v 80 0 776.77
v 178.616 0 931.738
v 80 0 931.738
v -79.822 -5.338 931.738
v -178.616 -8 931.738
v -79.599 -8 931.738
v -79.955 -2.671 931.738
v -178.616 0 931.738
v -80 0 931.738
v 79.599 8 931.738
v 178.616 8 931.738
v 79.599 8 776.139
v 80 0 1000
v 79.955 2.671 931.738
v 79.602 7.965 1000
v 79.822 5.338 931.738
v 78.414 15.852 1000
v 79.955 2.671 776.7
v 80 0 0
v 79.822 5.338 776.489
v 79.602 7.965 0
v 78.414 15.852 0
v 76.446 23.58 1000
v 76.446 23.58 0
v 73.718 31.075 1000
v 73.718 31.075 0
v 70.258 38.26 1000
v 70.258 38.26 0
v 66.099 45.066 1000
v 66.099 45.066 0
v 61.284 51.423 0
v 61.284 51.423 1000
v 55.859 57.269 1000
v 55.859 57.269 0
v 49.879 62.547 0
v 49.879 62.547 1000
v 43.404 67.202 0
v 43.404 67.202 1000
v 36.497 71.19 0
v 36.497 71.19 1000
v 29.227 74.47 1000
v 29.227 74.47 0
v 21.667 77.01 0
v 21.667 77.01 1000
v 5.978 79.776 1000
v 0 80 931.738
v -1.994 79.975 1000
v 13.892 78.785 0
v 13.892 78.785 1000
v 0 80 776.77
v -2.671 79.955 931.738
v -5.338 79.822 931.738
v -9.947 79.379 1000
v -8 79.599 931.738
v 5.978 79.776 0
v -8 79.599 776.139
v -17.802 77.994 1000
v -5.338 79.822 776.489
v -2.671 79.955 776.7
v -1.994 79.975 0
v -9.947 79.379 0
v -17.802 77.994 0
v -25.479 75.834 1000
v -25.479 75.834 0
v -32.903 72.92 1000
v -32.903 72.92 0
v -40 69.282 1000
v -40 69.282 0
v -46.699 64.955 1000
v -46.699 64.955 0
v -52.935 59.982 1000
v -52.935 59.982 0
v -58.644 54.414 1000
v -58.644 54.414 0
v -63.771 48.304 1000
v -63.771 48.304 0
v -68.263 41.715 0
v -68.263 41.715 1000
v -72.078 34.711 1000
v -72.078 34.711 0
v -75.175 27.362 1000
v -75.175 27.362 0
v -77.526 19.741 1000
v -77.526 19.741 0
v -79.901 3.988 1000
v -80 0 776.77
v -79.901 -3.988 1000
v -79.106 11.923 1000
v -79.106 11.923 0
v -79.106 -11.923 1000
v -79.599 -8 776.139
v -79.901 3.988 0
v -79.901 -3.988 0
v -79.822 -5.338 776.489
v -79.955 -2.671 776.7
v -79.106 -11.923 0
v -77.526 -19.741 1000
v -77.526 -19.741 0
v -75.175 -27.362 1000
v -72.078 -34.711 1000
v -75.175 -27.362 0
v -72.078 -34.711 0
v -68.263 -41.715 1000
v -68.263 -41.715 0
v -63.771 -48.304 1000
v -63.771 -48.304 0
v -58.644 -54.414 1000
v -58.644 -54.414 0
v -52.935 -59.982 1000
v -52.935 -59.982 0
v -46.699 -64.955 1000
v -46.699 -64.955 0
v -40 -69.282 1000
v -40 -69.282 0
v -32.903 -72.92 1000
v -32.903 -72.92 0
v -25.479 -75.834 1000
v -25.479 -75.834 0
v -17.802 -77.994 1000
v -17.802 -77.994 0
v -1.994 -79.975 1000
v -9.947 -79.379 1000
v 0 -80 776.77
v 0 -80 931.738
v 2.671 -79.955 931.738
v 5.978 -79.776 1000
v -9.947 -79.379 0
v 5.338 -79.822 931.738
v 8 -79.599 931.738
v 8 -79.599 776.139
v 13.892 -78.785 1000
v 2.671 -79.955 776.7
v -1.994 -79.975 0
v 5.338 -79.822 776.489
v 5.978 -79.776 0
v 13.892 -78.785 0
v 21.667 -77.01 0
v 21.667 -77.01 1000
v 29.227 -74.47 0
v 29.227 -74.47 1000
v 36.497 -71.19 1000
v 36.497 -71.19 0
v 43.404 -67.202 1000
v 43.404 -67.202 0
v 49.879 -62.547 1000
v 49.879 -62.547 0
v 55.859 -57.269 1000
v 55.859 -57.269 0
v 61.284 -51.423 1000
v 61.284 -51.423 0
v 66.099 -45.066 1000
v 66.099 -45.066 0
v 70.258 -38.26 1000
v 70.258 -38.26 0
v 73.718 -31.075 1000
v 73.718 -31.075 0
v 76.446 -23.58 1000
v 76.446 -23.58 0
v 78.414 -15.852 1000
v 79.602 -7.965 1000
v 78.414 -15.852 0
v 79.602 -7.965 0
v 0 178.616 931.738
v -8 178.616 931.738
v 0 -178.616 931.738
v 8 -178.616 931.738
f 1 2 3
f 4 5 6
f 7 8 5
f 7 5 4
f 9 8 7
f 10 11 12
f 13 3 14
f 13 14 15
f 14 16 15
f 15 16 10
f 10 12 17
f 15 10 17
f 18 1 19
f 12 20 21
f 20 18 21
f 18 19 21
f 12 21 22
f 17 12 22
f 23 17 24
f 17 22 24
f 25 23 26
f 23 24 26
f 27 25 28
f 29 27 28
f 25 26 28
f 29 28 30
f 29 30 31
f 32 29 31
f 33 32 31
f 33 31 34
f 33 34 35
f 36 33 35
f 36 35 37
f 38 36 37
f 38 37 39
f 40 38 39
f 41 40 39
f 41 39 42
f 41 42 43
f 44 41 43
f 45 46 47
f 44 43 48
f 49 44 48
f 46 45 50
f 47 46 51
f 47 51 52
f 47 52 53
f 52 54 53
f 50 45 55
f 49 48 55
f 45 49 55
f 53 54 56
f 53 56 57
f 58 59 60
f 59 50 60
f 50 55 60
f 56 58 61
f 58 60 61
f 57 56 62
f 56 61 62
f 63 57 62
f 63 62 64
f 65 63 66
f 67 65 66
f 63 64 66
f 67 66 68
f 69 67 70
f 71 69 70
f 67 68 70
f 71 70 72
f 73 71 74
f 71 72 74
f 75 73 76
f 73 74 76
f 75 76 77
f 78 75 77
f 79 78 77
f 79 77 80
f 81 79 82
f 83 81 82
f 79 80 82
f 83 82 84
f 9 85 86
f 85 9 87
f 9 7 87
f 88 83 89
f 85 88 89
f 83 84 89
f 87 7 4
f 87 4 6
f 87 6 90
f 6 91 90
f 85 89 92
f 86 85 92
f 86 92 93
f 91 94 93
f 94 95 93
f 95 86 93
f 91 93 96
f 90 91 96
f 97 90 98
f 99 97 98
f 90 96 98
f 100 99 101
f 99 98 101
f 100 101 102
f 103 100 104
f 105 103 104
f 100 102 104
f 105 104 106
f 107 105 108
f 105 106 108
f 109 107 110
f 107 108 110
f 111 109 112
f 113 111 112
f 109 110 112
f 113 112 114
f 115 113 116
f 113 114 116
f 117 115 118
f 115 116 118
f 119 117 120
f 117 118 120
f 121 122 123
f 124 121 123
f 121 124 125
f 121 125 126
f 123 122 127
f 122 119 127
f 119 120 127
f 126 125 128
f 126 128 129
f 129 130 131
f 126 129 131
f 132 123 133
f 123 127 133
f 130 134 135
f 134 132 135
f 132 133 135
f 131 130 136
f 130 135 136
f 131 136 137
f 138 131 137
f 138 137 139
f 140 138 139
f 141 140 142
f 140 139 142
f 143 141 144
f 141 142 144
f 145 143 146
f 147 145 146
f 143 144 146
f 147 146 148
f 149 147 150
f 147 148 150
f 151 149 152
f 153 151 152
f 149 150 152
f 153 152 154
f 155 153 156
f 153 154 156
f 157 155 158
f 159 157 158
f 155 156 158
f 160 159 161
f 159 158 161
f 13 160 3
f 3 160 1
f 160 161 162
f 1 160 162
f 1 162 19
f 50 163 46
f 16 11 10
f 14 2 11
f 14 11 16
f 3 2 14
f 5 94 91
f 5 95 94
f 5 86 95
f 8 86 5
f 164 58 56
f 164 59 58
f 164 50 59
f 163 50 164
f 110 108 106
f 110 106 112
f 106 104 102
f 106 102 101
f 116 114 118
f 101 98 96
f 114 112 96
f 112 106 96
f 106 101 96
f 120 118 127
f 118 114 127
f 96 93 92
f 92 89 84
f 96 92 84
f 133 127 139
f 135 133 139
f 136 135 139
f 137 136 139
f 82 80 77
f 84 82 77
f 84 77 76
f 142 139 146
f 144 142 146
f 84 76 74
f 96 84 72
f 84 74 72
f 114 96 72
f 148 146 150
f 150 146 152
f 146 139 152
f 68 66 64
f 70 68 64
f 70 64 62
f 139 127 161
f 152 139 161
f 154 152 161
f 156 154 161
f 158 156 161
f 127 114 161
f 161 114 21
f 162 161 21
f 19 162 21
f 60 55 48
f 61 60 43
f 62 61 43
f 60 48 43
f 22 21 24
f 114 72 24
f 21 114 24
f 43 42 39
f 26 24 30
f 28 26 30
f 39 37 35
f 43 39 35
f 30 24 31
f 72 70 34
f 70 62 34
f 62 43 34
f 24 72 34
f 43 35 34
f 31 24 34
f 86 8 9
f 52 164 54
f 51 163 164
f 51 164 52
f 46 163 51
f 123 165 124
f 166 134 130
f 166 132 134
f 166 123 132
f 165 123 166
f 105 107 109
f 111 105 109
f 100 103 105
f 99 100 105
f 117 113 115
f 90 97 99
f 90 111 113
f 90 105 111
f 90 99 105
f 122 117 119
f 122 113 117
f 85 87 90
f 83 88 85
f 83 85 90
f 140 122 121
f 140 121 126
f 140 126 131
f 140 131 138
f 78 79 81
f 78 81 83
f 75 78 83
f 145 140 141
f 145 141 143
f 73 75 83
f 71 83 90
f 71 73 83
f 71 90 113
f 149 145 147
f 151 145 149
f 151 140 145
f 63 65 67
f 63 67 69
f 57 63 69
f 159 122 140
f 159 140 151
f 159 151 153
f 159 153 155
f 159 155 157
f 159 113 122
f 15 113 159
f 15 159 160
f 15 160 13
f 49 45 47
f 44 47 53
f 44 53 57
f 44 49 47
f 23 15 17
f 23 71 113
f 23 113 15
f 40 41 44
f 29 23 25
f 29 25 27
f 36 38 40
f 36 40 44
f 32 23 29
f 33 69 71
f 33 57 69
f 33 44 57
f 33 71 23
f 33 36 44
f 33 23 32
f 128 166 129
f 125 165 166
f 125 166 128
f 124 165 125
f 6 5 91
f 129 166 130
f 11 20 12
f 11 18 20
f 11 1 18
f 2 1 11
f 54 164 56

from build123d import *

# Parameters (mm, degrees)
SZKIC1_R                    = 80
DODANIE_WYCI_GNI_CIE1_DEPTH = 1000
DODANIE_WYCI_GNI_CIE2_DEPTH = 8
SZYK_KO_OWY1_COUNT          = 4


with BuildPart() as part:
    # Szkic1 → Dodanie-wyciągnięcie1 (new body)
    with BuildSketch(Plane.XY):
        Circle(SZKIC1_R)
    extrude(amount=DODANIE_WYCI_GNI_CIE1_DEPTH)

    # Szkic5 → Dodanie-wyciągnięcie2 (add)
    with BuildSketch(Plane(origin=(0, 0, 0), x_dir=(1, 0, 0), z_dir=(0, 1, 0))):
        Polygon((73.616187197, -766.737875277), (178.616187197, -931.737875277), (73.616187197, -931.737875277), align=None)
    dodanie_wyci_gni_cie2 = extrude(amount=DODANIE_WYCI_GNI_CIE2_DEPTH)

    # Szyk kołowy1: Dodanie-wyciągnięcie2 ×4 about axis
    szyk_ko_owy1_axis = Axis((0, 0, 0), (0, 0, 1))
    for i in range(1, SZYK_KO_OWY1_COUNT):
        add(dodanie_wyci_gni_cie2.rotate(szyk_ko_owy1_axis, i * 360 / SZYK_KO_OWY1_COUNT))


solid = part.part
